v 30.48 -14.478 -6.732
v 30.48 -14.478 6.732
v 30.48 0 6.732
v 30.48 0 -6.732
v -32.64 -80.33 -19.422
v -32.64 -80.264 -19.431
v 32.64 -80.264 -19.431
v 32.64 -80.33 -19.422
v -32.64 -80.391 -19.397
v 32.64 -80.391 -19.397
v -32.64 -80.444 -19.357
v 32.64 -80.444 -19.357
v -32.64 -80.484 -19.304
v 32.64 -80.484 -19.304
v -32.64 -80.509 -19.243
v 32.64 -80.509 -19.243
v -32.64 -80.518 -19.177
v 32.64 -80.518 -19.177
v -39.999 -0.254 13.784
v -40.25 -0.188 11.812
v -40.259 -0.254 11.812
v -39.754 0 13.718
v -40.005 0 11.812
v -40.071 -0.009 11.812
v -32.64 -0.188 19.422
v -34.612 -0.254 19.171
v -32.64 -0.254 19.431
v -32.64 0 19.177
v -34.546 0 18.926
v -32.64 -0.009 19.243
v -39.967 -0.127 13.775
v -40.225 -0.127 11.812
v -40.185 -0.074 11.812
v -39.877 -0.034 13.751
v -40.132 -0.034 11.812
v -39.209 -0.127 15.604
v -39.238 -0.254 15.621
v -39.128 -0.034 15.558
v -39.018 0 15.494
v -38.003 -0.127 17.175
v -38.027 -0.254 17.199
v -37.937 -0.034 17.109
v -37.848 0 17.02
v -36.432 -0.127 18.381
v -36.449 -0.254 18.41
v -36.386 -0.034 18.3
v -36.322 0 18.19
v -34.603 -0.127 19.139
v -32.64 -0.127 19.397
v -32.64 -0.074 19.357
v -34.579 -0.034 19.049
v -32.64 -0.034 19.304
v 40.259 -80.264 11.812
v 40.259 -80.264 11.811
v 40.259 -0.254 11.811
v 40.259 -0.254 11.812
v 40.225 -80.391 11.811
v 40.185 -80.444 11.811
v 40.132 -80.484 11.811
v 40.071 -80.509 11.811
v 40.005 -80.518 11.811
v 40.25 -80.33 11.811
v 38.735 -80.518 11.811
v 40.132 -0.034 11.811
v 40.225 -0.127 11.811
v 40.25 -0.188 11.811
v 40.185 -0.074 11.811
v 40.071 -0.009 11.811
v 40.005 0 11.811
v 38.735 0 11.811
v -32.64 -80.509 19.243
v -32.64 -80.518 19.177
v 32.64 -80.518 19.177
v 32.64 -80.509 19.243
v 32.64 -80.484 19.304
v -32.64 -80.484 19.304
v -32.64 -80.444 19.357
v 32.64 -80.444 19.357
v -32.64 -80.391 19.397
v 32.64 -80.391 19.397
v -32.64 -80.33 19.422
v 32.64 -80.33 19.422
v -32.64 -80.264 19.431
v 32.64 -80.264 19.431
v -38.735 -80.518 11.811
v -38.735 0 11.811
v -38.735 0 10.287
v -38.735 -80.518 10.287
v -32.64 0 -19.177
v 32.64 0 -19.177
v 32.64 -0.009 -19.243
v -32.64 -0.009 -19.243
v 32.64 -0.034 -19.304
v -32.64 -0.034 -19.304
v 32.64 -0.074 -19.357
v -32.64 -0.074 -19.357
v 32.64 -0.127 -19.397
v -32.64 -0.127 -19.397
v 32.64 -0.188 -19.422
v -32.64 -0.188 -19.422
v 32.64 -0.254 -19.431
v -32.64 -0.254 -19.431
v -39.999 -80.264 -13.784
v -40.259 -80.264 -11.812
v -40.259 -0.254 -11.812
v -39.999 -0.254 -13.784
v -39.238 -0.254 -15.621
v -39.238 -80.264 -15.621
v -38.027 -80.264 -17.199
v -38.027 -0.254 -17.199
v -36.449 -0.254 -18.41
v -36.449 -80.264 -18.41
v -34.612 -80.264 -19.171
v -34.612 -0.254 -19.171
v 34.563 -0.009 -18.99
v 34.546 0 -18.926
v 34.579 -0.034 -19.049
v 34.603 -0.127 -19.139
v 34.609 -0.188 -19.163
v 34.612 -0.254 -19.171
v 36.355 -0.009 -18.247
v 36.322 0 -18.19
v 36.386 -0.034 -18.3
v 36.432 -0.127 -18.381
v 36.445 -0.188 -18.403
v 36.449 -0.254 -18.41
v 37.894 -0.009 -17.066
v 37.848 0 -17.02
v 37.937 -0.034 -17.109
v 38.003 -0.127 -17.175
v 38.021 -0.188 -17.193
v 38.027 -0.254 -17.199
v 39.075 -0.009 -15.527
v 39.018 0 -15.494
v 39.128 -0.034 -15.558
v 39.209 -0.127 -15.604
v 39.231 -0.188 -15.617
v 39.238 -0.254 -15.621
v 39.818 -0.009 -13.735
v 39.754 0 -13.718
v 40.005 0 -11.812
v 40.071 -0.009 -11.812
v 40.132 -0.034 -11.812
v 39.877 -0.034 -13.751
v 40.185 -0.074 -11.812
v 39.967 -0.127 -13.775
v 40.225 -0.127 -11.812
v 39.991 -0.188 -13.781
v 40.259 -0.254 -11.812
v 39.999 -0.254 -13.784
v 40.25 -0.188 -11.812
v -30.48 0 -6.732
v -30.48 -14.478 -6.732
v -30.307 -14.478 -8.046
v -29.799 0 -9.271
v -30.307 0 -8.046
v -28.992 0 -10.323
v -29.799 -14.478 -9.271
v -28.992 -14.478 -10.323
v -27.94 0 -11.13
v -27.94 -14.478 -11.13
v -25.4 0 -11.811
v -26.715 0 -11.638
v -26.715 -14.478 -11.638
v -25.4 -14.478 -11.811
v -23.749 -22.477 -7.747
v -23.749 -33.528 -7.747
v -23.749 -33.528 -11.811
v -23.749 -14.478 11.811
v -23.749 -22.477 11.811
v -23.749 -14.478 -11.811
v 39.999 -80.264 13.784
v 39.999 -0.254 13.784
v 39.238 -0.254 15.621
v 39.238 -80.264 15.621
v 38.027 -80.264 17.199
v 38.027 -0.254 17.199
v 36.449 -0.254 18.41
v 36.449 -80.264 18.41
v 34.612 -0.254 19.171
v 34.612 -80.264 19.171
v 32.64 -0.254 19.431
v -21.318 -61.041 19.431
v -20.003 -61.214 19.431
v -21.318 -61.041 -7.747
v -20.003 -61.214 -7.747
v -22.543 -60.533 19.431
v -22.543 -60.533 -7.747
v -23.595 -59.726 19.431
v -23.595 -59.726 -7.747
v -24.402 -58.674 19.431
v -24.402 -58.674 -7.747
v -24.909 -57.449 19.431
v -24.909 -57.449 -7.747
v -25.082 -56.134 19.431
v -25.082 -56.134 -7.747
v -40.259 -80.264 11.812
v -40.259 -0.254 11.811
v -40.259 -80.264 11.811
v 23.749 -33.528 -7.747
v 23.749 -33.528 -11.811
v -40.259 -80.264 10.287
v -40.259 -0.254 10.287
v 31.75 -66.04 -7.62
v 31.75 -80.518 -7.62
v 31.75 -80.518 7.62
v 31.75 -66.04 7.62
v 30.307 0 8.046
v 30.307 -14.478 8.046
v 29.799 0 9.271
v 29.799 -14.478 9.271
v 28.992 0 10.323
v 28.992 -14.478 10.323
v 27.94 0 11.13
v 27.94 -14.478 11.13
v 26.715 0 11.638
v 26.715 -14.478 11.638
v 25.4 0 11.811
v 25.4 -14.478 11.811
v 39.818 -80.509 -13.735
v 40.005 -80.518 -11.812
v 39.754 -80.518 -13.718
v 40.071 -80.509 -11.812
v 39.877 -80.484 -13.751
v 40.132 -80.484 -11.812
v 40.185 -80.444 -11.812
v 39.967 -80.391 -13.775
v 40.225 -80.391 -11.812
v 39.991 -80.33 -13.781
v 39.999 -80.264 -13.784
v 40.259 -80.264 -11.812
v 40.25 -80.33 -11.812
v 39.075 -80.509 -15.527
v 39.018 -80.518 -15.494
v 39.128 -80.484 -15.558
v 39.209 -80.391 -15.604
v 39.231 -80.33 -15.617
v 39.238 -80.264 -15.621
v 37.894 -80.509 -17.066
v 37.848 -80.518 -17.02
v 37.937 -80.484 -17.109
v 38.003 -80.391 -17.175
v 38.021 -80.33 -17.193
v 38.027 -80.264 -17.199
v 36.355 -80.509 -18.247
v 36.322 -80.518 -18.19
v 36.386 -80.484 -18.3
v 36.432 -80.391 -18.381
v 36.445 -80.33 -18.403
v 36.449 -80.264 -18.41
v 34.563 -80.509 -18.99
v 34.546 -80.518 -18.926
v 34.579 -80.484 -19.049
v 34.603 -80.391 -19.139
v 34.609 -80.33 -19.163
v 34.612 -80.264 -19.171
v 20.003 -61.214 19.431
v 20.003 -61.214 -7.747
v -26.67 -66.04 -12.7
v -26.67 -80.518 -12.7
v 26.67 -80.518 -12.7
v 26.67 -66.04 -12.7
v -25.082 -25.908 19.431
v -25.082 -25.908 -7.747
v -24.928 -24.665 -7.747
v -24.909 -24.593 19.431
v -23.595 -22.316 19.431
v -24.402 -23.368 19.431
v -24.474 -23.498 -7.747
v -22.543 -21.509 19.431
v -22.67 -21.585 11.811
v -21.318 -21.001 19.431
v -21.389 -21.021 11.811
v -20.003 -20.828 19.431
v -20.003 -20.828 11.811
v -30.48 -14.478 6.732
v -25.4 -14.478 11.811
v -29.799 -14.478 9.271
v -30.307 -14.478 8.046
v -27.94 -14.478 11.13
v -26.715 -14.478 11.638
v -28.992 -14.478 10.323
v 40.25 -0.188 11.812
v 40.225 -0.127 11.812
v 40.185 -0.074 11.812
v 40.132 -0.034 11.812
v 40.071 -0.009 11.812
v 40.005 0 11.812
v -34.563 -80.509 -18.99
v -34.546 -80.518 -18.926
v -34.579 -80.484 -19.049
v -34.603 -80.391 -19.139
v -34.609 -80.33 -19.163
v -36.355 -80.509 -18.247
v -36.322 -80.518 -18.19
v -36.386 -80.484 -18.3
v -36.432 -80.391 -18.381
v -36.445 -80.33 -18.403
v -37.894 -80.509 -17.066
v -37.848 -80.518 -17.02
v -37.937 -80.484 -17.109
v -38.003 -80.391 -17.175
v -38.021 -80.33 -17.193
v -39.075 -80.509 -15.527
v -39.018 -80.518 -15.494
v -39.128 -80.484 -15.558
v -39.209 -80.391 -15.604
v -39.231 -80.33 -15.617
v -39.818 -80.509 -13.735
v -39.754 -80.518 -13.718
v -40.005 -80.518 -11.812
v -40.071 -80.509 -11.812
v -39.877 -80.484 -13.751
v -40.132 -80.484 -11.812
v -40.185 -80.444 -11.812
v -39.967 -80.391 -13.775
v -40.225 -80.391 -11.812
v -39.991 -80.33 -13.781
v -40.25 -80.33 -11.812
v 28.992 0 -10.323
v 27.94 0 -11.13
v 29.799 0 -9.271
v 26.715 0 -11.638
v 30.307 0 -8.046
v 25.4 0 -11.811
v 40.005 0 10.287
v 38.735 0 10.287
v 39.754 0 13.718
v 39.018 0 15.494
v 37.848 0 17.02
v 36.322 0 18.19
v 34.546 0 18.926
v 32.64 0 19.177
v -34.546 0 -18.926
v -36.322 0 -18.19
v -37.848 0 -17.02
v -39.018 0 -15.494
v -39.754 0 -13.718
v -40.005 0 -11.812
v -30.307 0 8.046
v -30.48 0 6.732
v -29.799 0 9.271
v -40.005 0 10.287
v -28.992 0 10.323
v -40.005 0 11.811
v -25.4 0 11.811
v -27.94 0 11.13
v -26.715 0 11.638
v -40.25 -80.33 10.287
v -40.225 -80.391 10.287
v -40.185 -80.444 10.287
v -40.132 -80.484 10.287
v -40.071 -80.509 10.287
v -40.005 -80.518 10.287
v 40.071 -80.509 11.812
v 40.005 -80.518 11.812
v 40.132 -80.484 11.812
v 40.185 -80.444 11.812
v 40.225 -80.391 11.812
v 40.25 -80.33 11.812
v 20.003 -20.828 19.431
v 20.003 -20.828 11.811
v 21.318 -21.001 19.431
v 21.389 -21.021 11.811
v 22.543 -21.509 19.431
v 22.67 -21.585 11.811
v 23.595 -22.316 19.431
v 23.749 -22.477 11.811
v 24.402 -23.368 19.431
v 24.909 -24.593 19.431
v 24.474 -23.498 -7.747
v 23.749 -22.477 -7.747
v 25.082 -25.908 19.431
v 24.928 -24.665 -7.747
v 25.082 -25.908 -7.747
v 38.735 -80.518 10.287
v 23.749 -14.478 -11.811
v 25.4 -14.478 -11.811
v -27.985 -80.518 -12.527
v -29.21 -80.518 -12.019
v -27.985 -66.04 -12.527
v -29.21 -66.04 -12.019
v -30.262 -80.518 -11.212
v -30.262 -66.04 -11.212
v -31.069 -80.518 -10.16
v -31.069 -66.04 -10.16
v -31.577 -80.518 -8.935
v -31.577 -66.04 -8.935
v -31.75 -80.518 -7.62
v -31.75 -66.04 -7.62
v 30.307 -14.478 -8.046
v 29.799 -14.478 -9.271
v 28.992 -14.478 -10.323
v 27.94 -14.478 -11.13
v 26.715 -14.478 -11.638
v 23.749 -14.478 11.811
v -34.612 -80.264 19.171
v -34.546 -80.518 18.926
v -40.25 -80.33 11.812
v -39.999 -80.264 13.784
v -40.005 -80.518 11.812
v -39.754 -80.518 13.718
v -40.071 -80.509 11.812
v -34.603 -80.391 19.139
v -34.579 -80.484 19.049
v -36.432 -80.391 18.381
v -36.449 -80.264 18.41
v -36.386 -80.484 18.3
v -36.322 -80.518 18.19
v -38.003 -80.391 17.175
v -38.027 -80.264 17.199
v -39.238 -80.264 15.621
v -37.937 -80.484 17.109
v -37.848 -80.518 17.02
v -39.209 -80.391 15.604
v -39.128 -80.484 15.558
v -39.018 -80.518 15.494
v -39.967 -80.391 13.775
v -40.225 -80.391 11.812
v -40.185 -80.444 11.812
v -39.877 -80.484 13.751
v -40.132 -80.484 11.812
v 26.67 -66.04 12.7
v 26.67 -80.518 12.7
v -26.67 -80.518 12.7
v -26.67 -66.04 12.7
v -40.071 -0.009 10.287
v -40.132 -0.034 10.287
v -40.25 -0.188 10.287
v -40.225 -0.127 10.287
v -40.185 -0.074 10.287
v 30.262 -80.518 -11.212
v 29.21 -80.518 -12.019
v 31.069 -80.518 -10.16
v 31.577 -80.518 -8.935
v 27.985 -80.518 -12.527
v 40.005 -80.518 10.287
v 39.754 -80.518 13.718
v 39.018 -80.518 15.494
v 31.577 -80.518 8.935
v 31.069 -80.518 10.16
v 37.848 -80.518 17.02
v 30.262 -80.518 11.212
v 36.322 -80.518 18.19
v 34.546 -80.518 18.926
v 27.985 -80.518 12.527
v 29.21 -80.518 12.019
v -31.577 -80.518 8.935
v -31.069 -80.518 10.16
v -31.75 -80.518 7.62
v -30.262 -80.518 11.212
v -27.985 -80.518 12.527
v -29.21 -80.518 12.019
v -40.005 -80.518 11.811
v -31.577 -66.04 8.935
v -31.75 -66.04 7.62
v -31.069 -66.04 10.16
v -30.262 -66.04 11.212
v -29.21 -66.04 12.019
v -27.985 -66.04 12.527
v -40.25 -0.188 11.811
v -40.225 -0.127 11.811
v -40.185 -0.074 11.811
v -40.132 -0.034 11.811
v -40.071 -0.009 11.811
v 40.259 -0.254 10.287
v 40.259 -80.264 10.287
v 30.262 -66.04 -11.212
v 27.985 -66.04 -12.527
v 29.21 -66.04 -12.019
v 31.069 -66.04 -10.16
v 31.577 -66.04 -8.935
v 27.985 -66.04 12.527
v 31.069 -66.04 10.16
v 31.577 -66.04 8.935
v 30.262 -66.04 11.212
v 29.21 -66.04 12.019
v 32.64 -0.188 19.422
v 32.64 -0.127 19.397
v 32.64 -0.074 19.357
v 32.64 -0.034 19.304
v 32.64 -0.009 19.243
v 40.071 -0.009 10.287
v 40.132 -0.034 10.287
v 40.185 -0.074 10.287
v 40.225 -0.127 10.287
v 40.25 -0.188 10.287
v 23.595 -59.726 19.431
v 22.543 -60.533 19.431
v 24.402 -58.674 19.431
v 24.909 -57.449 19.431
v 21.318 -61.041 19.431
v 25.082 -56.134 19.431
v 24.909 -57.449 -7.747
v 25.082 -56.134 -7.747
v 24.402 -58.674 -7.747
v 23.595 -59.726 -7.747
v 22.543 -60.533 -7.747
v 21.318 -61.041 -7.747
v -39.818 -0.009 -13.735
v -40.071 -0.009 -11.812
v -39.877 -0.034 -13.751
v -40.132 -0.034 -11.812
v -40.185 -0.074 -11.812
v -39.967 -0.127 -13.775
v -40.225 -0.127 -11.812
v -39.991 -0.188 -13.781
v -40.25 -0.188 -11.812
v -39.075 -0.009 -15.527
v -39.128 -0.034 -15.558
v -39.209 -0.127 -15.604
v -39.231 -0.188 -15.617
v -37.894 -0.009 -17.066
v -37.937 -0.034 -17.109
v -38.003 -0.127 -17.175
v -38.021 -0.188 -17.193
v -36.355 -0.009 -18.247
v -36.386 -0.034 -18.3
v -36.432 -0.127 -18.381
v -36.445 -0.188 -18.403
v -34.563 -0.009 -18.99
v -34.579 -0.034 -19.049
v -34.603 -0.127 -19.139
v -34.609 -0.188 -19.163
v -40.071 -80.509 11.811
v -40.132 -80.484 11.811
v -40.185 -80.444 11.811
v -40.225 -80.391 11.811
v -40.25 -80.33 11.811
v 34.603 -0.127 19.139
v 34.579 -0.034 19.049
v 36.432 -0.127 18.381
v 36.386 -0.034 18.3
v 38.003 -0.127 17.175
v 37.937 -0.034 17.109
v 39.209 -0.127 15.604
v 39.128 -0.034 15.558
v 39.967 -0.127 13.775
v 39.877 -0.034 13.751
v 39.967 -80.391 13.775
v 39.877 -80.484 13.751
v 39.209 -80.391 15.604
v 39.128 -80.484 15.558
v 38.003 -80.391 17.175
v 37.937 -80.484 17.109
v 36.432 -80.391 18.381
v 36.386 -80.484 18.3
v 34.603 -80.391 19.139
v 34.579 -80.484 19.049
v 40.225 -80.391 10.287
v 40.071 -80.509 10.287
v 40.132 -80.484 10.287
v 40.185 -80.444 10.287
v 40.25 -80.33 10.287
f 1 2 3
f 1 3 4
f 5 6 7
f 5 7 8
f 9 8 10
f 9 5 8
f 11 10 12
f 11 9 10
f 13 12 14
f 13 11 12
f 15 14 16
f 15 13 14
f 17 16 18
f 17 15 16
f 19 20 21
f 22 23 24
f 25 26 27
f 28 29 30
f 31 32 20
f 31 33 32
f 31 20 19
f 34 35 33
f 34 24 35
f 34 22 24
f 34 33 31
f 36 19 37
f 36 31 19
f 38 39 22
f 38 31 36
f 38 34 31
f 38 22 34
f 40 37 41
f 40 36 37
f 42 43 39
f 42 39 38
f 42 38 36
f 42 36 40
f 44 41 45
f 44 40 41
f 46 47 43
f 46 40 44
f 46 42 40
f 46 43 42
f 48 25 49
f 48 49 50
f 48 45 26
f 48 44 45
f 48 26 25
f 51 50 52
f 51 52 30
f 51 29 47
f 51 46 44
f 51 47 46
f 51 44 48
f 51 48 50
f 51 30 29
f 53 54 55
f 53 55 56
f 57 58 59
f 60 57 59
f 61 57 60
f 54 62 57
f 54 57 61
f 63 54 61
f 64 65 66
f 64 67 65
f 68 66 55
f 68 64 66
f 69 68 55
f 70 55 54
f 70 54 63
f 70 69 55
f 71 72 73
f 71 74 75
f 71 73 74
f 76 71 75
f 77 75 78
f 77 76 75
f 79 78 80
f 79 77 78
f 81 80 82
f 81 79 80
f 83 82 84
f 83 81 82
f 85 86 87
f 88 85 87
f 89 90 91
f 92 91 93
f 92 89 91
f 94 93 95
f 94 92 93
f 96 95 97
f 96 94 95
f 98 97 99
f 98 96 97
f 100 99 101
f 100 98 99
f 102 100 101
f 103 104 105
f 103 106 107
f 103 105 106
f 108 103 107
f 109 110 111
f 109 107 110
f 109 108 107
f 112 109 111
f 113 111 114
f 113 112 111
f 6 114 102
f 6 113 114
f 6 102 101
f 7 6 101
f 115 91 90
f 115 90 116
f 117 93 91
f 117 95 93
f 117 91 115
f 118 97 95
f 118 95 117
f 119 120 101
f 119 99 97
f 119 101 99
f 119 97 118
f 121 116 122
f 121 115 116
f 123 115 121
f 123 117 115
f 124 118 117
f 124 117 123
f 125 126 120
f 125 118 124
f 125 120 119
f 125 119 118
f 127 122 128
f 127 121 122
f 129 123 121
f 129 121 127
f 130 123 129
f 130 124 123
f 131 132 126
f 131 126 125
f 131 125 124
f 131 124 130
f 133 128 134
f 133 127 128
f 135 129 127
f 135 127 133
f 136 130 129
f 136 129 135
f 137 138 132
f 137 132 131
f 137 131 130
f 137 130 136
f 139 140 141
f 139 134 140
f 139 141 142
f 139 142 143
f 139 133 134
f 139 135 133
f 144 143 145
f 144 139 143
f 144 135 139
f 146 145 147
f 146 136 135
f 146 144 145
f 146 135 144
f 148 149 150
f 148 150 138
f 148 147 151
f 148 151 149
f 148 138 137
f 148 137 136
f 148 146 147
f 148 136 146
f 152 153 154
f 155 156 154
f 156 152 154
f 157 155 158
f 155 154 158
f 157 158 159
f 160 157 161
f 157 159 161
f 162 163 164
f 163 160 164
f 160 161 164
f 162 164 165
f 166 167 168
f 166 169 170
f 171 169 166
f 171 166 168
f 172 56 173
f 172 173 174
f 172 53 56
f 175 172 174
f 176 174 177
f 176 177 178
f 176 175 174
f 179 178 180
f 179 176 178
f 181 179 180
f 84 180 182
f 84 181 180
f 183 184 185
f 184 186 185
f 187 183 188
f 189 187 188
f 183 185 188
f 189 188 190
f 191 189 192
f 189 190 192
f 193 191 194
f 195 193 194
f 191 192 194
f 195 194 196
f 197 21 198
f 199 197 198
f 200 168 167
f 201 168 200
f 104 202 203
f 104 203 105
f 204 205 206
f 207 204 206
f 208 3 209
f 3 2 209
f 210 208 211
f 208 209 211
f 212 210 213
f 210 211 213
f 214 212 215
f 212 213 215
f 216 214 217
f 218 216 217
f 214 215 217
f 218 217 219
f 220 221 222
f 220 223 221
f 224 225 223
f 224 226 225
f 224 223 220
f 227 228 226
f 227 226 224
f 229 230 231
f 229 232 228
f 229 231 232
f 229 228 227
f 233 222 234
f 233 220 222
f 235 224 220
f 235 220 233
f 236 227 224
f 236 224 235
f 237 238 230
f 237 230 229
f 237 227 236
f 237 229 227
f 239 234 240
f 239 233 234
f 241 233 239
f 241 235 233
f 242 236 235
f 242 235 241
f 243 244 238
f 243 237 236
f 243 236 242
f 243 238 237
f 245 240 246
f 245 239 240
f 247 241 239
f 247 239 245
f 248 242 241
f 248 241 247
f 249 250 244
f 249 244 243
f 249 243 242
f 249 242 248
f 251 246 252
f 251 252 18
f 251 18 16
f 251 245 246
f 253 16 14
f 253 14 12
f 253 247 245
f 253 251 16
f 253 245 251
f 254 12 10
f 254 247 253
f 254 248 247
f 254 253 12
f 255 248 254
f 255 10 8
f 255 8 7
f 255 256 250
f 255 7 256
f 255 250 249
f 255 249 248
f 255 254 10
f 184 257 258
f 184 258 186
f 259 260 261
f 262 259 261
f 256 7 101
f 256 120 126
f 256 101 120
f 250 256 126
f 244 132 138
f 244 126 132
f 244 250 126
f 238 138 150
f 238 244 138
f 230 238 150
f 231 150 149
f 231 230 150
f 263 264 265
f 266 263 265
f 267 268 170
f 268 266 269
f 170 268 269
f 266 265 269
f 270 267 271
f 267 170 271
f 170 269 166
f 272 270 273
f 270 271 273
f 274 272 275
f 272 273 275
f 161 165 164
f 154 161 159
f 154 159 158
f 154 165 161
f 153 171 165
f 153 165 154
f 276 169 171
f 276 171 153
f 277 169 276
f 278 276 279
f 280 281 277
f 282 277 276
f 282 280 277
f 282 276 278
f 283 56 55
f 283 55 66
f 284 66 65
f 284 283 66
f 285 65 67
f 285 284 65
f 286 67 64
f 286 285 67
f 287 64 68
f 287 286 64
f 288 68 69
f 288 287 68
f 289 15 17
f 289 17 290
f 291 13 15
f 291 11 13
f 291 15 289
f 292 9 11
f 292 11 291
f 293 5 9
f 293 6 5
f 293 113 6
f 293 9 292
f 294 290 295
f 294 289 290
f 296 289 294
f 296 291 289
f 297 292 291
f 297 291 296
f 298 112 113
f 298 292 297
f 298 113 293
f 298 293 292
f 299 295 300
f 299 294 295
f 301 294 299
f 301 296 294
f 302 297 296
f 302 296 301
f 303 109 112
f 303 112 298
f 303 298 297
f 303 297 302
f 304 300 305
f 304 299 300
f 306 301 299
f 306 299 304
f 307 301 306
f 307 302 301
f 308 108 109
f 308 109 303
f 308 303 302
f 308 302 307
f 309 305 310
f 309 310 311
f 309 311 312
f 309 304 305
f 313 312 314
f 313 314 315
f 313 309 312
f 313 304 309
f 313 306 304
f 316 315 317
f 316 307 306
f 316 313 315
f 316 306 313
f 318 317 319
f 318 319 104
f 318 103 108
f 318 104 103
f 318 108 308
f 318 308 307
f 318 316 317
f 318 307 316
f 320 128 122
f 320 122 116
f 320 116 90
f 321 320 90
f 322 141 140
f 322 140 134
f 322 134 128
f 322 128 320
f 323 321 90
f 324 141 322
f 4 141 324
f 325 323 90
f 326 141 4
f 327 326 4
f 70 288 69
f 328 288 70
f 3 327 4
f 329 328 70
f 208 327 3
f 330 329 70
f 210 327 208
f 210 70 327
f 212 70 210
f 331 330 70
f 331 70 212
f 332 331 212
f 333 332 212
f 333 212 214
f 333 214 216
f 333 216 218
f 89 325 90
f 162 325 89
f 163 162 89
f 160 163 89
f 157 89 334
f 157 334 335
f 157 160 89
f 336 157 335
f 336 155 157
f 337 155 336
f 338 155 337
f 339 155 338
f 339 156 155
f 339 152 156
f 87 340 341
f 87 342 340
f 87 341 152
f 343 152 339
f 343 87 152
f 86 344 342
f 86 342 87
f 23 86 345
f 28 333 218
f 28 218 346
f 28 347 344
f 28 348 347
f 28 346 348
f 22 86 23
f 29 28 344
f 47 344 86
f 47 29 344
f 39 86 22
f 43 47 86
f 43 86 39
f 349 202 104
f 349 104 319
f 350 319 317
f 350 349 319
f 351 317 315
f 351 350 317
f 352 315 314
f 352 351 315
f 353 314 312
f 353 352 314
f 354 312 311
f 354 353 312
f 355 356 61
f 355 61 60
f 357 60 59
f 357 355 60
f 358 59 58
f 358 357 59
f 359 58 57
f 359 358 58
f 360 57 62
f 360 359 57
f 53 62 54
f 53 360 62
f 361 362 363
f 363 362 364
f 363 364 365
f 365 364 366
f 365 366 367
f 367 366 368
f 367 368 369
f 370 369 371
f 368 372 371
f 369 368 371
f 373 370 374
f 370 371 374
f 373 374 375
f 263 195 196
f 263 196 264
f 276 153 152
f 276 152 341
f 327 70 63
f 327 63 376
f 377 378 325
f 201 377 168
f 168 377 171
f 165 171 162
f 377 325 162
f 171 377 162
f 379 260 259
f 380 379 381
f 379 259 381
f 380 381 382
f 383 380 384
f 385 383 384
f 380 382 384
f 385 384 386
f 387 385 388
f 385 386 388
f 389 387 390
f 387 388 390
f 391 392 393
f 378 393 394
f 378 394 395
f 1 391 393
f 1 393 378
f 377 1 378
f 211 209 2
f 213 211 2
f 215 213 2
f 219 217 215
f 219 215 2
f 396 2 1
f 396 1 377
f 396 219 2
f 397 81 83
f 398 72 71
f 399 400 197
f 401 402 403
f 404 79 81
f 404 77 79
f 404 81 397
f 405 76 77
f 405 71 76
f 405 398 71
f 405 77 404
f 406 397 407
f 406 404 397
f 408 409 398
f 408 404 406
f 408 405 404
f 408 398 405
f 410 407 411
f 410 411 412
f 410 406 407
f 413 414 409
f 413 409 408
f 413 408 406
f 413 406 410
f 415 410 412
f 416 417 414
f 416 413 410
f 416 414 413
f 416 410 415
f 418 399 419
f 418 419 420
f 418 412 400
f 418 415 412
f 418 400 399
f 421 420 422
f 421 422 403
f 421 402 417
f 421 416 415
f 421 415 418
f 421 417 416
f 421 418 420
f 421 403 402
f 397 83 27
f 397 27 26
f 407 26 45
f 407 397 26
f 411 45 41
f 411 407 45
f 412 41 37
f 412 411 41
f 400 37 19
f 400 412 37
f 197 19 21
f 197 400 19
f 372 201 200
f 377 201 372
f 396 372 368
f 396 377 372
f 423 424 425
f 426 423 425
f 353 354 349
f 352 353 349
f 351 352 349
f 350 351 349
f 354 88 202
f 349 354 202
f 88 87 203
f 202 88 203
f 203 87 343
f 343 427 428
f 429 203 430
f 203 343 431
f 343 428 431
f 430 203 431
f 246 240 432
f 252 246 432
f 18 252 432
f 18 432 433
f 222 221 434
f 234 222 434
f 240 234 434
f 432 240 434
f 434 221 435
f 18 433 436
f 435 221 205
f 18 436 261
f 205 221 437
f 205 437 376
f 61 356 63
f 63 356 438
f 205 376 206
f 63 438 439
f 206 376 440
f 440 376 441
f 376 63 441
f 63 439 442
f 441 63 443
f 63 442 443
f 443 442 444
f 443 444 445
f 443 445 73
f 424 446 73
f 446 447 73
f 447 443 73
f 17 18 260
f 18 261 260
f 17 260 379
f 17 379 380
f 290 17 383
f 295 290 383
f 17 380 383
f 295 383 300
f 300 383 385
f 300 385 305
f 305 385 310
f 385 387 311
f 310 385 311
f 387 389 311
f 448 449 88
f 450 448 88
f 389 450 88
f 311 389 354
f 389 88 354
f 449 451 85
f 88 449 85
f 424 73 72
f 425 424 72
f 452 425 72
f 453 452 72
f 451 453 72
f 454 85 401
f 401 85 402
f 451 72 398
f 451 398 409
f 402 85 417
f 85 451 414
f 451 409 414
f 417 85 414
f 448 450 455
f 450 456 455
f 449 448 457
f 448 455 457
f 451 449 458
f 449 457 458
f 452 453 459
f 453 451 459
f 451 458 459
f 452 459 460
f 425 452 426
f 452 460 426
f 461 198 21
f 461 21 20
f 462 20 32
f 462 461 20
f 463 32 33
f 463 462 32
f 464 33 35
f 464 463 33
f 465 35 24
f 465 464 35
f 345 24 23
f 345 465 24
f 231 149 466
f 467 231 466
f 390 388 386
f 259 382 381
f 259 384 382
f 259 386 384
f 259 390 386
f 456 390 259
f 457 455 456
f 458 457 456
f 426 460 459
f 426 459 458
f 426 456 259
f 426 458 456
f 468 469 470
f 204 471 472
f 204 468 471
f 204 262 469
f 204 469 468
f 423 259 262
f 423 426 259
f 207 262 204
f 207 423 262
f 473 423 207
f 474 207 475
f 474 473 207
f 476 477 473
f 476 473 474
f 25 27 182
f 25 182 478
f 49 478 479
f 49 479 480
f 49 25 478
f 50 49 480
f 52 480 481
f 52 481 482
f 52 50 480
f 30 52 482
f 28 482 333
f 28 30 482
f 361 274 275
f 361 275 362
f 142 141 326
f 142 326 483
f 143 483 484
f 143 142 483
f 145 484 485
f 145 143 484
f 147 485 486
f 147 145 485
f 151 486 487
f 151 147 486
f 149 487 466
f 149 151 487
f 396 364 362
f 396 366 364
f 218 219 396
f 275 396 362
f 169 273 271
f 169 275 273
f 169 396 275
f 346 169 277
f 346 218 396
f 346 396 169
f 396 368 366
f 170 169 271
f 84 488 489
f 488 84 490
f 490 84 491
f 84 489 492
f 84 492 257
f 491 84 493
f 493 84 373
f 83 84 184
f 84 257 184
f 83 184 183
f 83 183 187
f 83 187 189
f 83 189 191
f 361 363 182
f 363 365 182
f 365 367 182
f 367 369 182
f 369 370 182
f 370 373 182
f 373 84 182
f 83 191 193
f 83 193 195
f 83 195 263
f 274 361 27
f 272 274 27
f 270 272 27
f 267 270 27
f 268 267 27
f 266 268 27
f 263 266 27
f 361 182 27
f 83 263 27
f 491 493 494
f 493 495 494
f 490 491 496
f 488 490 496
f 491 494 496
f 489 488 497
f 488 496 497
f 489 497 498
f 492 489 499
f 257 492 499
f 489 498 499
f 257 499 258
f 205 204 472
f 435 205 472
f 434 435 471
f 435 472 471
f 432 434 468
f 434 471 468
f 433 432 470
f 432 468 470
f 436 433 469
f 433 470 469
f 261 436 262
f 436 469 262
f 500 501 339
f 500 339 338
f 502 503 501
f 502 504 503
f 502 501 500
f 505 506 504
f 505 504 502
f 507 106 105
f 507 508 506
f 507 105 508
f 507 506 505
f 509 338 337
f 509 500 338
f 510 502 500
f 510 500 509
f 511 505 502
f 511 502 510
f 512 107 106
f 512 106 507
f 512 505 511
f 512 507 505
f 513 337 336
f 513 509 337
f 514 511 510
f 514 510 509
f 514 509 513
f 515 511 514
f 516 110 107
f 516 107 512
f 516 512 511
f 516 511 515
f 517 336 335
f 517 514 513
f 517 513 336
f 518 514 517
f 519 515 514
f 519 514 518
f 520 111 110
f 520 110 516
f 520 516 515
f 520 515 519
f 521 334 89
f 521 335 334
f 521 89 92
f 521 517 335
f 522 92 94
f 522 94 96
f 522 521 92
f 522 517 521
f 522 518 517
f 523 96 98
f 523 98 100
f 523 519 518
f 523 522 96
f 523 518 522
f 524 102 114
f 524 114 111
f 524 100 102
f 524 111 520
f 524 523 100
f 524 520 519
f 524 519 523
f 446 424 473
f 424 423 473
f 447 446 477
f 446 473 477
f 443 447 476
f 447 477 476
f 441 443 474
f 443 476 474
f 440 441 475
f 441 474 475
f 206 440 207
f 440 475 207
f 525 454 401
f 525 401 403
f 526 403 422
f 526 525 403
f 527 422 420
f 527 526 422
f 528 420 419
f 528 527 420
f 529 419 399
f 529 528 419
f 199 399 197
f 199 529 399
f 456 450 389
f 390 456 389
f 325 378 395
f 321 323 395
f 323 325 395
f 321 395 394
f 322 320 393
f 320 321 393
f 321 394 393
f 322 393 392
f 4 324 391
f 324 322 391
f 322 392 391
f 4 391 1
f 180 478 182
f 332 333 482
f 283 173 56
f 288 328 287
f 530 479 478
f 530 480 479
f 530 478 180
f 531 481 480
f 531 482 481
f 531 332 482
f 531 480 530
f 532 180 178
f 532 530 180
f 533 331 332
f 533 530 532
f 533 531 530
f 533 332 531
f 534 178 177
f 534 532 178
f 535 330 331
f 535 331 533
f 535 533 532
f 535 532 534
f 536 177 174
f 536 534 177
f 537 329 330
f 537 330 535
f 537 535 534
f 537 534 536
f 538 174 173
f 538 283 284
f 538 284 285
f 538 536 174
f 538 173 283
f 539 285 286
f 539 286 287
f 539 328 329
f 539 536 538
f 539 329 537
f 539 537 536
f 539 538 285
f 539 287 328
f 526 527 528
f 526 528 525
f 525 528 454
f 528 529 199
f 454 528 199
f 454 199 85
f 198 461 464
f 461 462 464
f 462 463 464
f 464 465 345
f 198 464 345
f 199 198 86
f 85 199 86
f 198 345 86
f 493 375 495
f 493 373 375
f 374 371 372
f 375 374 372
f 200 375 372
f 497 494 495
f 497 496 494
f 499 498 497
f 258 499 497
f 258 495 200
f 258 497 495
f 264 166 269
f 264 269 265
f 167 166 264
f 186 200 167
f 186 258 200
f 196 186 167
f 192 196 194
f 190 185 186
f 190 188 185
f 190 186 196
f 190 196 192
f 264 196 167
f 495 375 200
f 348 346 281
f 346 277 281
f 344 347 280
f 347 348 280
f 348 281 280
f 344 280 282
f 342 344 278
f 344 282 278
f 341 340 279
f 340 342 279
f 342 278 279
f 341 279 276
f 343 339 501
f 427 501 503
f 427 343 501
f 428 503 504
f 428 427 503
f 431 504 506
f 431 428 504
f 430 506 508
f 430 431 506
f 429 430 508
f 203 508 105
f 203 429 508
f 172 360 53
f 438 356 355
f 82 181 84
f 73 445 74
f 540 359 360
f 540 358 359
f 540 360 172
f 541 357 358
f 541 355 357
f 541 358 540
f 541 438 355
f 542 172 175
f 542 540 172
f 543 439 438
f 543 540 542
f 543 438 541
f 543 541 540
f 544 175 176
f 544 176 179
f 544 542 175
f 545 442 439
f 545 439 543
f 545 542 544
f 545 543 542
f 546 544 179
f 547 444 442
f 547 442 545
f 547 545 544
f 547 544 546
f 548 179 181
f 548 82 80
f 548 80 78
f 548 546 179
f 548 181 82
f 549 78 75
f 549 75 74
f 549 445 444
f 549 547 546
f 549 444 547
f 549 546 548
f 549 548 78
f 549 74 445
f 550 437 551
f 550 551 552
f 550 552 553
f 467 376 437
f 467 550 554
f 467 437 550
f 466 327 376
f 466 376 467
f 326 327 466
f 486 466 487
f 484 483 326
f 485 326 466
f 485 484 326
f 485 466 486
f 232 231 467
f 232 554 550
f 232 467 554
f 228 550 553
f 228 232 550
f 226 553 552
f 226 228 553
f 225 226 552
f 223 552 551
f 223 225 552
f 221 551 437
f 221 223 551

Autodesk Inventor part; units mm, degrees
ref_plane "YZ Plane" through (0, 0, 0) normal (1, 0, 0) x (0, 1, 0)
ref_plane "XZ Plane" through (0, 0, 0) normal (0, 1, 0) x (-1, 0, 0)
ref_plane "XY Plane" through (0, 0, 0) normal (0, 0, 1) x (1, 0, 0)
sketch "Sketch1" plane through (0, 0, 0) normal (0, 1, 0) x (-1, 0, 0)
  line L0 (-40.259, 19.431) -> (40.259, 19.431)
  line L1 (40.259, 19.431) -> (40.259, -19.431)
  line L2 (40.259, -19.431) -> (-40.259, -19.431)
  line L3 (-40.259, -19.431) -> (-40.259, 19.431)
  line L4 (-40.259, 11.811) -> (-38.735, 11.811)
  line L5 (-38.735, 11.811) -> (-38.735, 10.287)
  line L6 (-38.735, 10.287) -> (-40.259, 10.287)
  line L7 (-40.259, 10.287) -> (-40.259, 11.811)
  line L8 (40.259, 11.811) -> (38.735, 11.811)
  line L9 (38.735, 11.811) -> (38.735, 10.287)
  line L10 (38.735, 10.287) -> (40.259, 10.287)
  line L11 (40.259, 10.287) -> (40.259, 11.811)
  point P0 (0, 0)
  point P1 (40.259, 0)
  point P2 (0, -19.431)
  point P3 (0, 0)
  dimension "d0" = 80.518
  dimension "d1" = 38.862
  dimension "d20" = 1.524
  dimension "d21" = 7.62
extrude "Extrusion1" add sketch "Sketch1" against normal blind 80.518 contours L0 L1 L8 L9 L10 L2 L3 L6 L5 L4
sketch "Sketch2" plane through (0, 0, 0) normal (0, 1, 0) x (-1, 0, 0)
  line L0 (-30.48, -11.811) -> (30.48, -11.811)
  line L1 (30.48, -11.811) -> (30.48, 11.811)
  line L2 (30.48, 11.811) -> (-30.48, 11.811)
  line L3 (-30.48, 11.811) -> (-30.48, -11.811)
  line L4 (40.259, -19.431) -> (-40.259, -19.431) projected
  line L5 (-40.259, 19.431) -> (40.259, 19.431) projected
  point P0 (0, 0)
  point P1 (0, 11.811)
  point P2 (-30.48, 0)
  dimension "d4" = 60.96
  dimension "d5" = 23.622
extrude "Extrusion2" cut sketch "Sketch2" against normal blind 14.478
sketch "Sketch3" plane through (0, -80.518, 0) normal (0, -1, 0) x (1, 0, 0)
  line L0 (-31.75, -12.7) -> (31.75, -12.7)
  line L1 (31.75, -12.7) -> (31.75, 12.7)
  line L2 (31.75, 12.7) -> (-31.75, 12.7)
  line L3 (-31.75, 12.7) -> (-31.75, -12.7)
  point P0 (0, 0)
  point P1 (0, -12.7)
  point P2 (-31.75, 0)
  dimension "d10" = 63.5
  dimension "d11" = 25.4
extrude "Extrusion3" cut sketch "Sketch3" against normal blind 14.478
sketch "Sketch4" plane through (40.259, 0, 19.431) normal (0, 0, 1) x (-1, 0, 0)
  line L0 (65.3415, 20.828) -> (15.1765, 20.828)
  line L1 (15.1765, 20.828) -> (15.1765, 61.214)
  line L2 (15.1765, 61.214) -> (65.3415, 61.214)
  line L3 (65.3415, 61.214) -> (65.3415, 20.828)
  line L4 (0, 0) -> (80.518, 0) projected
  point P0 (40.259, 0)
  point P1 (40.259, 0)
  point P2 (40.259, 20.828)
  dimension "d15" = 20.828
  dimension "d16" = 40.386
  dimension "d17" = 50.165
extrude "Extrusion4" cut sketch "Sketch4" against normal blind 27.178
fillet "Fillet1" radius 5.08 12 edges at (30.48, -7.239, 11.811) (30.48, -7.239, -11.811) (-30.48, -7.239, -11.811) (-30.48, -7.239, 11.811) (-31.75, -73.279, -12.7) (-31.75, -73.279, 12.7) (31.75, -73.279, 12.7) (31.75, -73.279, -12.7) (-25.0825, -20.828, 5.842) (25.0825, -20.828, 5.842) (25.0825, -61.214, 5.842) (-25.0825, -61.214, 5.842)
fillet "Fillet1" radius 7.62 4 edges at (-40.259, -40.259, 19.431) (-40.259, -40.259, -19.431) (40.259, -40.259, 19.431) (40.259, -40.259, -19.431)
fillet "Fillet2" radius 0.254 16 edges at (38.0273, -80.518, -17.1993) (0, -80.518, -19.431) (-38.0273, -80.518, -17.1993) (-40.259, -80.518, -0.7623) (40.259, -80.518, -0.7623) (0, -80.518, 19.431) (-38.0273, -80.518, 17.1993) (38.0273, -80.518, 17.1993) (0, 0, 19.431) (-38.0273, 0, 17.1993) (38.0273, 0, 17.1993) (38.0273, 0, -17.1993) (0, 0, -19.431) (-38.0273, 0, -17.1993) (-40.259, 0, -0.7623) (40.259, 0, -0.7623)
sketch "Sketch6" plane through (0, -14.478, 0) normal (0, 1, 0) x (1, 0, 0)
  line L0 (0, 27.2034) -> (0, -27.2034) projected
  line L1 (23.749, -11.811) -> (-23.749, -11.811)
  line L2 (-23.749, -11.811) -> (-23.749, 11.811)
  line L3 (-23.749, 11.811) -> (23.749, 11.811)
  line L4 (23.749, 11.811) -> (23.749, -11.811)
  line L5 (40.259, -10.287) -> (40.259, 11.811) projected
  line L6 (-40.259, 11.811) -> (-40.259, -10.287) projected
  line L7 (32.639, 19.431) -> (-32.639, 19.431) projected
  line L8 (25.4, -11.811) -> (-25.4, -11.811) projected
  line L9 (-25.4, 11.811) -> (25.4, 11.811) projected
  point P0 (0, 0)
  dimension "d26" = 16.51
  dimension "d28" = 16.51
  dimension "d30" = 0
  dimension "d31" = 0
extrude "Extrusion5" cut sketch "Sketch6" against normal blind 19.05
properties part number "Motor Passenger Section"
